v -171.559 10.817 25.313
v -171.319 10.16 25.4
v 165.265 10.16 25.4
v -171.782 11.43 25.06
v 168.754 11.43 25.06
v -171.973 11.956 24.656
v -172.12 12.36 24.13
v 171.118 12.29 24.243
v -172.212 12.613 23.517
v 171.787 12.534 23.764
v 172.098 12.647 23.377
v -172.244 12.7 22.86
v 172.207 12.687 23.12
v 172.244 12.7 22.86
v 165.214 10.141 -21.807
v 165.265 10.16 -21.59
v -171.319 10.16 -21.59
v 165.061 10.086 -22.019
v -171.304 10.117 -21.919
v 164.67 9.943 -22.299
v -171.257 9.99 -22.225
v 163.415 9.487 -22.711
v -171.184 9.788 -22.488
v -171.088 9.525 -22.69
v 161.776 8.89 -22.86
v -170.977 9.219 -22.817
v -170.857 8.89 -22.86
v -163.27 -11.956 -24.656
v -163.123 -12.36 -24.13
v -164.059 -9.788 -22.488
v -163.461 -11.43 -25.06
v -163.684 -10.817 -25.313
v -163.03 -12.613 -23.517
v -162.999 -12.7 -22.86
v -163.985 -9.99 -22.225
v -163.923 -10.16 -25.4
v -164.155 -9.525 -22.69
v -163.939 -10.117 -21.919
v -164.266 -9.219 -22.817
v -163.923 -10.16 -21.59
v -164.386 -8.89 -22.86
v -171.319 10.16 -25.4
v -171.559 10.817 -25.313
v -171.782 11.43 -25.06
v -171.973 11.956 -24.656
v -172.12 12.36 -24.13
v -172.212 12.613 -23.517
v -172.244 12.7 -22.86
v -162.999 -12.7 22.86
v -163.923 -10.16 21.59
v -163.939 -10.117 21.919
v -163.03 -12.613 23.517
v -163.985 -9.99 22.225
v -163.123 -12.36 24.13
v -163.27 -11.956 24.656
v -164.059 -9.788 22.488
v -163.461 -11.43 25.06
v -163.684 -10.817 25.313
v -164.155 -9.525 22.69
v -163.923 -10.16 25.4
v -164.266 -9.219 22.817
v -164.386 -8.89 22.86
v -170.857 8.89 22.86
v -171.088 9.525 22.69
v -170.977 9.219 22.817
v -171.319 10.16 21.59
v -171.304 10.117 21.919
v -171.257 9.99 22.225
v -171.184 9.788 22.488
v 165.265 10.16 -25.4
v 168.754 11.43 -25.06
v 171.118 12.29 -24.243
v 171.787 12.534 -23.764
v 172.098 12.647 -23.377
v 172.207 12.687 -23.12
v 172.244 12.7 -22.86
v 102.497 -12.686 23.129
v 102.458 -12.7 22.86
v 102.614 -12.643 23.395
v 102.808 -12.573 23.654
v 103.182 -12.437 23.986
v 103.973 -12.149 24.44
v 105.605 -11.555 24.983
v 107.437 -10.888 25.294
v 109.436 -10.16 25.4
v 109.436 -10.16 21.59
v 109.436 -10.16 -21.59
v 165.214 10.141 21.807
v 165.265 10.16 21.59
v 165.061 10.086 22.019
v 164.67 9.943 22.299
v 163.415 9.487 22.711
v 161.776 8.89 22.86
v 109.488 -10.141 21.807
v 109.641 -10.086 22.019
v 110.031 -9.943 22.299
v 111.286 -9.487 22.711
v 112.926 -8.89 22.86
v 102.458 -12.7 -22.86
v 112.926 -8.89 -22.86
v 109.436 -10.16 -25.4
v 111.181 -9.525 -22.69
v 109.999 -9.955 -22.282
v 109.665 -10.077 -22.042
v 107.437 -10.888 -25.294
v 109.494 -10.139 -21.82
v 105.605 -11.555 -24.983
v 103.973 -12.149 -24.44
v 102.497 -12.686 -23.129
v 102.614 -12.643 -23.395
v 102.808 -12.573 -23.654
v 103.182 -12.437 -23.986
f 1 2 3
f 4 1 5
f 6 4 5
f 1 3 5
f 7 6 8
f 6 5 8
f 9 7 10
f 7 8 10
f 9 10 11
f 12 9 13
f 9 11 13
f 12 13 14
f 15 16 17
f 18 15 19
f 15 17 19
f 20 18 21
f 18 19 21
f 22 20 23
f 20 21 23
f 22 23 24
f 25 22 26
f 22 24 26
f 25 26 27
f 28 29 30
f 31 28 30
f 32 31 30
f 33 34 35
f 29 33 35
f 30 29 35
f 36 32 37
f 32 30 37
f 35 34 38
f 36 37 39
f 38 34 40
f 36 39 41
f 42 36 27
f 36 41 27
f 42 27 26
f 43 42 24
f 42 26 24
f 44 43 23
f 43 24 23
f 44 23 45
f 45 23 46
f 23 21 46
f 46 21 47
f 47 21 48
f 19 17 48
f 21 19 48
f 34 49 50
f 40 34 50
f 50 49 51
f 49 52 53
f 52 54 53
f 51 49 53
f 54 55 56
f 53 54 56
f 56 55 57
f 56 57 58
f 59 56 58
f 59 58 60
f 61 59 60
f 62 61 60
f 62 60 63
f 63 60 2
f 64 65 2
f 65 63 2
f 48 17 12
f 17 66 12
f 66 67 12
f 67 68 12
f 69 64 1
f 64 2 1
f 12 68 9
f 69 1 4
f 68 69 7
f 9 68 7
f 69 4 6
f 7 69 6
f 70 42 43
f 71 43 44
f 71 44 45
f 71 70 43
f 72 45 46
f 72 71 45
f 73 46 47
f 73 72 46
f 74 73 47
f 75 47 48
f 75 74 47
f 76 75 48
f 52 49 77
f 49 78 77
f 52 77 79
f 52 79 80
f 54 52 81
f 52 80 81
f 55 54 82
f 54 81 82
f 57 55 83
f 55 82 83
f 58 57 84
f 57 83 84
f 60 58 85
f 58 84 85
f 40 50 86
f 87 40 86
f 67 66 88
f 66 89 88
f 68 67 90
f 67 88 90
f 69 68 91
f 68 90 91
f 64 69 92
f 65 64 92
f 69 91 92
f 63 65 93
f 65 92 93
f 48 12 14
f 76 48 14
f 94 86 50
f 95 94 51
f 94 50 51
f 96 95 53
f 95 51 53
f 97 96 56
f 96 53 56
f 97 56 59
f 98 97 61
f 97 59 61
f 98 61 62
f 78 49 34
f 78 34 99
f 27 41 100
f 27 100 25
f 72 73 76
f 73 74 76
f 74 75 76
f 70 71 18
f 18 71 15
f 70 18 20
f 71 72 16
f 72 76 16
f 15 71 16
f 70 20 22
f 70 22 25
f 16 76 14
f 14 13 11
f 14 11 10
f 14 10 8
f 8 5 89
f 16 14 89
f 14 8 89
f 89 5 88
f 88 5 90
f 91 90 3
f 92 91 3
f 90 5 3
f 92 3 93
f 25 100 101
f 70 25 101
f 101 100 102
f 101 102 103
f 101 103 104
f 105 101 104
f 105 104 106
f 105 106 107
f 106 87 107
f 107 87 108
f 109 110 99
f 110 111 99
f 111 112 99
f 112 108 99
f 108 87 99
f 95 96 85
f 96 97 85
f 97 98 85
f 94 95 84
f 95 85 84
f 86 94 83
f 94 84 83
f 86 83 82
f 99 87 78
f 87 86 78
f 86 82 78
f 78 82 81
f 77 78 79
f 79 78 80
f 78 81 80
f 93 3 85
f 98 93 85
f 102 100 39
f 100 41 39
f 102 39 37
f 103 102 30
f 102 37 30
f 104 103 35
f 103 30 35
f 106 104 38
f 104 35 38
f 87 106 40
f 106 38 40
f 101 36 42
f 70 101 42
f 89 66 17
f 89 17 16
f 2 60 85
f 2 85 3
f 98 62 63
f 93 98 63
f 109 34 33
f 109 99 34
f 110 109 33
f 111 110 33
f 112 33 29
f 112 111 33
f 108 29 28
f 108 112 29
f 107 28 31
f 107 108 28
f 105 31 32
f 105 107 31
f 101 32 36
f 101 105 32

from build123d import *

# Parameters (mm, degrees)
F0_W     = 344.4875
F0_H     = 50.8
F1_DEPTH = 12.7
F2_T     = -2.54
F4_DEPTH = 50.801
F6_DEPTH = 50.801
F7_R     = 2.54
F8_R     = 1.27


# Not quite as in the source:
# - a feature names something its author has since deleted; it is built from what else it names


with BuildPart() as f1:
    # F0 (on Front) → F1 (new body, symmetric)
    with BuildSketch(Plane.XZ):
        Rectangle(F0_W, F0_H)
    extrude(amount=F1_DEPTH, both=True)

    # F2
    f2_openings = [f1.faces().sort_by_distance(p)[0] for p in [
        (-172.24375, 0, 0),
        (172.24375, 0, 0),
    ]]
    offset(amount=F2_T, openings=f2_openings)

    # F3 (on face) → F4 (cut, through all)
    with BuildSketch(Plane.XY.offset(25.4)):
        Polygon((-162.9989060496, -12.7), (-172.24375, 12.7), (-172.24375, -12.7), align=None)
    extrude(amount=-F4_DEPTH, mode=Mode.SUBTRACT)

    # F5 (on face) → F6 (cut, through all)
    with BuildSketch(Plane.XY.offset(25.4)):
        Polygon((172.24375, -12.7), (172.24375, 12.7), (102.4578235459, -12.7), align=None)
    extrude(amount=-F6_DEPTH, mode=Mode.SUBTRACT)

    # F7
    f7_edges = [f1.edges().sort_by_distance(p)[0] for p in [
        (-30.270541, -12.7, 25.4),
        (0, 12.7, 25.4),
        (0, 12.7, -25.4),
        (-30.270541, -12.7, -25.4),
    ]]
    fillet(f7_edges, radius=F7_R)

    # F8
    f8_edges = [f1.edges().sort_by_distance(p)[0] for p in [
        (-27.243487, -10.16, -22.86),
        (-27.243487, -10.16, 22.86),
        (-3.027054, 10.16, 22.86),
        (-3.027054, 10.16, -22.86),
    ]]
    fillet(f8_edges, radius=F8_R)


solid = f1.part
